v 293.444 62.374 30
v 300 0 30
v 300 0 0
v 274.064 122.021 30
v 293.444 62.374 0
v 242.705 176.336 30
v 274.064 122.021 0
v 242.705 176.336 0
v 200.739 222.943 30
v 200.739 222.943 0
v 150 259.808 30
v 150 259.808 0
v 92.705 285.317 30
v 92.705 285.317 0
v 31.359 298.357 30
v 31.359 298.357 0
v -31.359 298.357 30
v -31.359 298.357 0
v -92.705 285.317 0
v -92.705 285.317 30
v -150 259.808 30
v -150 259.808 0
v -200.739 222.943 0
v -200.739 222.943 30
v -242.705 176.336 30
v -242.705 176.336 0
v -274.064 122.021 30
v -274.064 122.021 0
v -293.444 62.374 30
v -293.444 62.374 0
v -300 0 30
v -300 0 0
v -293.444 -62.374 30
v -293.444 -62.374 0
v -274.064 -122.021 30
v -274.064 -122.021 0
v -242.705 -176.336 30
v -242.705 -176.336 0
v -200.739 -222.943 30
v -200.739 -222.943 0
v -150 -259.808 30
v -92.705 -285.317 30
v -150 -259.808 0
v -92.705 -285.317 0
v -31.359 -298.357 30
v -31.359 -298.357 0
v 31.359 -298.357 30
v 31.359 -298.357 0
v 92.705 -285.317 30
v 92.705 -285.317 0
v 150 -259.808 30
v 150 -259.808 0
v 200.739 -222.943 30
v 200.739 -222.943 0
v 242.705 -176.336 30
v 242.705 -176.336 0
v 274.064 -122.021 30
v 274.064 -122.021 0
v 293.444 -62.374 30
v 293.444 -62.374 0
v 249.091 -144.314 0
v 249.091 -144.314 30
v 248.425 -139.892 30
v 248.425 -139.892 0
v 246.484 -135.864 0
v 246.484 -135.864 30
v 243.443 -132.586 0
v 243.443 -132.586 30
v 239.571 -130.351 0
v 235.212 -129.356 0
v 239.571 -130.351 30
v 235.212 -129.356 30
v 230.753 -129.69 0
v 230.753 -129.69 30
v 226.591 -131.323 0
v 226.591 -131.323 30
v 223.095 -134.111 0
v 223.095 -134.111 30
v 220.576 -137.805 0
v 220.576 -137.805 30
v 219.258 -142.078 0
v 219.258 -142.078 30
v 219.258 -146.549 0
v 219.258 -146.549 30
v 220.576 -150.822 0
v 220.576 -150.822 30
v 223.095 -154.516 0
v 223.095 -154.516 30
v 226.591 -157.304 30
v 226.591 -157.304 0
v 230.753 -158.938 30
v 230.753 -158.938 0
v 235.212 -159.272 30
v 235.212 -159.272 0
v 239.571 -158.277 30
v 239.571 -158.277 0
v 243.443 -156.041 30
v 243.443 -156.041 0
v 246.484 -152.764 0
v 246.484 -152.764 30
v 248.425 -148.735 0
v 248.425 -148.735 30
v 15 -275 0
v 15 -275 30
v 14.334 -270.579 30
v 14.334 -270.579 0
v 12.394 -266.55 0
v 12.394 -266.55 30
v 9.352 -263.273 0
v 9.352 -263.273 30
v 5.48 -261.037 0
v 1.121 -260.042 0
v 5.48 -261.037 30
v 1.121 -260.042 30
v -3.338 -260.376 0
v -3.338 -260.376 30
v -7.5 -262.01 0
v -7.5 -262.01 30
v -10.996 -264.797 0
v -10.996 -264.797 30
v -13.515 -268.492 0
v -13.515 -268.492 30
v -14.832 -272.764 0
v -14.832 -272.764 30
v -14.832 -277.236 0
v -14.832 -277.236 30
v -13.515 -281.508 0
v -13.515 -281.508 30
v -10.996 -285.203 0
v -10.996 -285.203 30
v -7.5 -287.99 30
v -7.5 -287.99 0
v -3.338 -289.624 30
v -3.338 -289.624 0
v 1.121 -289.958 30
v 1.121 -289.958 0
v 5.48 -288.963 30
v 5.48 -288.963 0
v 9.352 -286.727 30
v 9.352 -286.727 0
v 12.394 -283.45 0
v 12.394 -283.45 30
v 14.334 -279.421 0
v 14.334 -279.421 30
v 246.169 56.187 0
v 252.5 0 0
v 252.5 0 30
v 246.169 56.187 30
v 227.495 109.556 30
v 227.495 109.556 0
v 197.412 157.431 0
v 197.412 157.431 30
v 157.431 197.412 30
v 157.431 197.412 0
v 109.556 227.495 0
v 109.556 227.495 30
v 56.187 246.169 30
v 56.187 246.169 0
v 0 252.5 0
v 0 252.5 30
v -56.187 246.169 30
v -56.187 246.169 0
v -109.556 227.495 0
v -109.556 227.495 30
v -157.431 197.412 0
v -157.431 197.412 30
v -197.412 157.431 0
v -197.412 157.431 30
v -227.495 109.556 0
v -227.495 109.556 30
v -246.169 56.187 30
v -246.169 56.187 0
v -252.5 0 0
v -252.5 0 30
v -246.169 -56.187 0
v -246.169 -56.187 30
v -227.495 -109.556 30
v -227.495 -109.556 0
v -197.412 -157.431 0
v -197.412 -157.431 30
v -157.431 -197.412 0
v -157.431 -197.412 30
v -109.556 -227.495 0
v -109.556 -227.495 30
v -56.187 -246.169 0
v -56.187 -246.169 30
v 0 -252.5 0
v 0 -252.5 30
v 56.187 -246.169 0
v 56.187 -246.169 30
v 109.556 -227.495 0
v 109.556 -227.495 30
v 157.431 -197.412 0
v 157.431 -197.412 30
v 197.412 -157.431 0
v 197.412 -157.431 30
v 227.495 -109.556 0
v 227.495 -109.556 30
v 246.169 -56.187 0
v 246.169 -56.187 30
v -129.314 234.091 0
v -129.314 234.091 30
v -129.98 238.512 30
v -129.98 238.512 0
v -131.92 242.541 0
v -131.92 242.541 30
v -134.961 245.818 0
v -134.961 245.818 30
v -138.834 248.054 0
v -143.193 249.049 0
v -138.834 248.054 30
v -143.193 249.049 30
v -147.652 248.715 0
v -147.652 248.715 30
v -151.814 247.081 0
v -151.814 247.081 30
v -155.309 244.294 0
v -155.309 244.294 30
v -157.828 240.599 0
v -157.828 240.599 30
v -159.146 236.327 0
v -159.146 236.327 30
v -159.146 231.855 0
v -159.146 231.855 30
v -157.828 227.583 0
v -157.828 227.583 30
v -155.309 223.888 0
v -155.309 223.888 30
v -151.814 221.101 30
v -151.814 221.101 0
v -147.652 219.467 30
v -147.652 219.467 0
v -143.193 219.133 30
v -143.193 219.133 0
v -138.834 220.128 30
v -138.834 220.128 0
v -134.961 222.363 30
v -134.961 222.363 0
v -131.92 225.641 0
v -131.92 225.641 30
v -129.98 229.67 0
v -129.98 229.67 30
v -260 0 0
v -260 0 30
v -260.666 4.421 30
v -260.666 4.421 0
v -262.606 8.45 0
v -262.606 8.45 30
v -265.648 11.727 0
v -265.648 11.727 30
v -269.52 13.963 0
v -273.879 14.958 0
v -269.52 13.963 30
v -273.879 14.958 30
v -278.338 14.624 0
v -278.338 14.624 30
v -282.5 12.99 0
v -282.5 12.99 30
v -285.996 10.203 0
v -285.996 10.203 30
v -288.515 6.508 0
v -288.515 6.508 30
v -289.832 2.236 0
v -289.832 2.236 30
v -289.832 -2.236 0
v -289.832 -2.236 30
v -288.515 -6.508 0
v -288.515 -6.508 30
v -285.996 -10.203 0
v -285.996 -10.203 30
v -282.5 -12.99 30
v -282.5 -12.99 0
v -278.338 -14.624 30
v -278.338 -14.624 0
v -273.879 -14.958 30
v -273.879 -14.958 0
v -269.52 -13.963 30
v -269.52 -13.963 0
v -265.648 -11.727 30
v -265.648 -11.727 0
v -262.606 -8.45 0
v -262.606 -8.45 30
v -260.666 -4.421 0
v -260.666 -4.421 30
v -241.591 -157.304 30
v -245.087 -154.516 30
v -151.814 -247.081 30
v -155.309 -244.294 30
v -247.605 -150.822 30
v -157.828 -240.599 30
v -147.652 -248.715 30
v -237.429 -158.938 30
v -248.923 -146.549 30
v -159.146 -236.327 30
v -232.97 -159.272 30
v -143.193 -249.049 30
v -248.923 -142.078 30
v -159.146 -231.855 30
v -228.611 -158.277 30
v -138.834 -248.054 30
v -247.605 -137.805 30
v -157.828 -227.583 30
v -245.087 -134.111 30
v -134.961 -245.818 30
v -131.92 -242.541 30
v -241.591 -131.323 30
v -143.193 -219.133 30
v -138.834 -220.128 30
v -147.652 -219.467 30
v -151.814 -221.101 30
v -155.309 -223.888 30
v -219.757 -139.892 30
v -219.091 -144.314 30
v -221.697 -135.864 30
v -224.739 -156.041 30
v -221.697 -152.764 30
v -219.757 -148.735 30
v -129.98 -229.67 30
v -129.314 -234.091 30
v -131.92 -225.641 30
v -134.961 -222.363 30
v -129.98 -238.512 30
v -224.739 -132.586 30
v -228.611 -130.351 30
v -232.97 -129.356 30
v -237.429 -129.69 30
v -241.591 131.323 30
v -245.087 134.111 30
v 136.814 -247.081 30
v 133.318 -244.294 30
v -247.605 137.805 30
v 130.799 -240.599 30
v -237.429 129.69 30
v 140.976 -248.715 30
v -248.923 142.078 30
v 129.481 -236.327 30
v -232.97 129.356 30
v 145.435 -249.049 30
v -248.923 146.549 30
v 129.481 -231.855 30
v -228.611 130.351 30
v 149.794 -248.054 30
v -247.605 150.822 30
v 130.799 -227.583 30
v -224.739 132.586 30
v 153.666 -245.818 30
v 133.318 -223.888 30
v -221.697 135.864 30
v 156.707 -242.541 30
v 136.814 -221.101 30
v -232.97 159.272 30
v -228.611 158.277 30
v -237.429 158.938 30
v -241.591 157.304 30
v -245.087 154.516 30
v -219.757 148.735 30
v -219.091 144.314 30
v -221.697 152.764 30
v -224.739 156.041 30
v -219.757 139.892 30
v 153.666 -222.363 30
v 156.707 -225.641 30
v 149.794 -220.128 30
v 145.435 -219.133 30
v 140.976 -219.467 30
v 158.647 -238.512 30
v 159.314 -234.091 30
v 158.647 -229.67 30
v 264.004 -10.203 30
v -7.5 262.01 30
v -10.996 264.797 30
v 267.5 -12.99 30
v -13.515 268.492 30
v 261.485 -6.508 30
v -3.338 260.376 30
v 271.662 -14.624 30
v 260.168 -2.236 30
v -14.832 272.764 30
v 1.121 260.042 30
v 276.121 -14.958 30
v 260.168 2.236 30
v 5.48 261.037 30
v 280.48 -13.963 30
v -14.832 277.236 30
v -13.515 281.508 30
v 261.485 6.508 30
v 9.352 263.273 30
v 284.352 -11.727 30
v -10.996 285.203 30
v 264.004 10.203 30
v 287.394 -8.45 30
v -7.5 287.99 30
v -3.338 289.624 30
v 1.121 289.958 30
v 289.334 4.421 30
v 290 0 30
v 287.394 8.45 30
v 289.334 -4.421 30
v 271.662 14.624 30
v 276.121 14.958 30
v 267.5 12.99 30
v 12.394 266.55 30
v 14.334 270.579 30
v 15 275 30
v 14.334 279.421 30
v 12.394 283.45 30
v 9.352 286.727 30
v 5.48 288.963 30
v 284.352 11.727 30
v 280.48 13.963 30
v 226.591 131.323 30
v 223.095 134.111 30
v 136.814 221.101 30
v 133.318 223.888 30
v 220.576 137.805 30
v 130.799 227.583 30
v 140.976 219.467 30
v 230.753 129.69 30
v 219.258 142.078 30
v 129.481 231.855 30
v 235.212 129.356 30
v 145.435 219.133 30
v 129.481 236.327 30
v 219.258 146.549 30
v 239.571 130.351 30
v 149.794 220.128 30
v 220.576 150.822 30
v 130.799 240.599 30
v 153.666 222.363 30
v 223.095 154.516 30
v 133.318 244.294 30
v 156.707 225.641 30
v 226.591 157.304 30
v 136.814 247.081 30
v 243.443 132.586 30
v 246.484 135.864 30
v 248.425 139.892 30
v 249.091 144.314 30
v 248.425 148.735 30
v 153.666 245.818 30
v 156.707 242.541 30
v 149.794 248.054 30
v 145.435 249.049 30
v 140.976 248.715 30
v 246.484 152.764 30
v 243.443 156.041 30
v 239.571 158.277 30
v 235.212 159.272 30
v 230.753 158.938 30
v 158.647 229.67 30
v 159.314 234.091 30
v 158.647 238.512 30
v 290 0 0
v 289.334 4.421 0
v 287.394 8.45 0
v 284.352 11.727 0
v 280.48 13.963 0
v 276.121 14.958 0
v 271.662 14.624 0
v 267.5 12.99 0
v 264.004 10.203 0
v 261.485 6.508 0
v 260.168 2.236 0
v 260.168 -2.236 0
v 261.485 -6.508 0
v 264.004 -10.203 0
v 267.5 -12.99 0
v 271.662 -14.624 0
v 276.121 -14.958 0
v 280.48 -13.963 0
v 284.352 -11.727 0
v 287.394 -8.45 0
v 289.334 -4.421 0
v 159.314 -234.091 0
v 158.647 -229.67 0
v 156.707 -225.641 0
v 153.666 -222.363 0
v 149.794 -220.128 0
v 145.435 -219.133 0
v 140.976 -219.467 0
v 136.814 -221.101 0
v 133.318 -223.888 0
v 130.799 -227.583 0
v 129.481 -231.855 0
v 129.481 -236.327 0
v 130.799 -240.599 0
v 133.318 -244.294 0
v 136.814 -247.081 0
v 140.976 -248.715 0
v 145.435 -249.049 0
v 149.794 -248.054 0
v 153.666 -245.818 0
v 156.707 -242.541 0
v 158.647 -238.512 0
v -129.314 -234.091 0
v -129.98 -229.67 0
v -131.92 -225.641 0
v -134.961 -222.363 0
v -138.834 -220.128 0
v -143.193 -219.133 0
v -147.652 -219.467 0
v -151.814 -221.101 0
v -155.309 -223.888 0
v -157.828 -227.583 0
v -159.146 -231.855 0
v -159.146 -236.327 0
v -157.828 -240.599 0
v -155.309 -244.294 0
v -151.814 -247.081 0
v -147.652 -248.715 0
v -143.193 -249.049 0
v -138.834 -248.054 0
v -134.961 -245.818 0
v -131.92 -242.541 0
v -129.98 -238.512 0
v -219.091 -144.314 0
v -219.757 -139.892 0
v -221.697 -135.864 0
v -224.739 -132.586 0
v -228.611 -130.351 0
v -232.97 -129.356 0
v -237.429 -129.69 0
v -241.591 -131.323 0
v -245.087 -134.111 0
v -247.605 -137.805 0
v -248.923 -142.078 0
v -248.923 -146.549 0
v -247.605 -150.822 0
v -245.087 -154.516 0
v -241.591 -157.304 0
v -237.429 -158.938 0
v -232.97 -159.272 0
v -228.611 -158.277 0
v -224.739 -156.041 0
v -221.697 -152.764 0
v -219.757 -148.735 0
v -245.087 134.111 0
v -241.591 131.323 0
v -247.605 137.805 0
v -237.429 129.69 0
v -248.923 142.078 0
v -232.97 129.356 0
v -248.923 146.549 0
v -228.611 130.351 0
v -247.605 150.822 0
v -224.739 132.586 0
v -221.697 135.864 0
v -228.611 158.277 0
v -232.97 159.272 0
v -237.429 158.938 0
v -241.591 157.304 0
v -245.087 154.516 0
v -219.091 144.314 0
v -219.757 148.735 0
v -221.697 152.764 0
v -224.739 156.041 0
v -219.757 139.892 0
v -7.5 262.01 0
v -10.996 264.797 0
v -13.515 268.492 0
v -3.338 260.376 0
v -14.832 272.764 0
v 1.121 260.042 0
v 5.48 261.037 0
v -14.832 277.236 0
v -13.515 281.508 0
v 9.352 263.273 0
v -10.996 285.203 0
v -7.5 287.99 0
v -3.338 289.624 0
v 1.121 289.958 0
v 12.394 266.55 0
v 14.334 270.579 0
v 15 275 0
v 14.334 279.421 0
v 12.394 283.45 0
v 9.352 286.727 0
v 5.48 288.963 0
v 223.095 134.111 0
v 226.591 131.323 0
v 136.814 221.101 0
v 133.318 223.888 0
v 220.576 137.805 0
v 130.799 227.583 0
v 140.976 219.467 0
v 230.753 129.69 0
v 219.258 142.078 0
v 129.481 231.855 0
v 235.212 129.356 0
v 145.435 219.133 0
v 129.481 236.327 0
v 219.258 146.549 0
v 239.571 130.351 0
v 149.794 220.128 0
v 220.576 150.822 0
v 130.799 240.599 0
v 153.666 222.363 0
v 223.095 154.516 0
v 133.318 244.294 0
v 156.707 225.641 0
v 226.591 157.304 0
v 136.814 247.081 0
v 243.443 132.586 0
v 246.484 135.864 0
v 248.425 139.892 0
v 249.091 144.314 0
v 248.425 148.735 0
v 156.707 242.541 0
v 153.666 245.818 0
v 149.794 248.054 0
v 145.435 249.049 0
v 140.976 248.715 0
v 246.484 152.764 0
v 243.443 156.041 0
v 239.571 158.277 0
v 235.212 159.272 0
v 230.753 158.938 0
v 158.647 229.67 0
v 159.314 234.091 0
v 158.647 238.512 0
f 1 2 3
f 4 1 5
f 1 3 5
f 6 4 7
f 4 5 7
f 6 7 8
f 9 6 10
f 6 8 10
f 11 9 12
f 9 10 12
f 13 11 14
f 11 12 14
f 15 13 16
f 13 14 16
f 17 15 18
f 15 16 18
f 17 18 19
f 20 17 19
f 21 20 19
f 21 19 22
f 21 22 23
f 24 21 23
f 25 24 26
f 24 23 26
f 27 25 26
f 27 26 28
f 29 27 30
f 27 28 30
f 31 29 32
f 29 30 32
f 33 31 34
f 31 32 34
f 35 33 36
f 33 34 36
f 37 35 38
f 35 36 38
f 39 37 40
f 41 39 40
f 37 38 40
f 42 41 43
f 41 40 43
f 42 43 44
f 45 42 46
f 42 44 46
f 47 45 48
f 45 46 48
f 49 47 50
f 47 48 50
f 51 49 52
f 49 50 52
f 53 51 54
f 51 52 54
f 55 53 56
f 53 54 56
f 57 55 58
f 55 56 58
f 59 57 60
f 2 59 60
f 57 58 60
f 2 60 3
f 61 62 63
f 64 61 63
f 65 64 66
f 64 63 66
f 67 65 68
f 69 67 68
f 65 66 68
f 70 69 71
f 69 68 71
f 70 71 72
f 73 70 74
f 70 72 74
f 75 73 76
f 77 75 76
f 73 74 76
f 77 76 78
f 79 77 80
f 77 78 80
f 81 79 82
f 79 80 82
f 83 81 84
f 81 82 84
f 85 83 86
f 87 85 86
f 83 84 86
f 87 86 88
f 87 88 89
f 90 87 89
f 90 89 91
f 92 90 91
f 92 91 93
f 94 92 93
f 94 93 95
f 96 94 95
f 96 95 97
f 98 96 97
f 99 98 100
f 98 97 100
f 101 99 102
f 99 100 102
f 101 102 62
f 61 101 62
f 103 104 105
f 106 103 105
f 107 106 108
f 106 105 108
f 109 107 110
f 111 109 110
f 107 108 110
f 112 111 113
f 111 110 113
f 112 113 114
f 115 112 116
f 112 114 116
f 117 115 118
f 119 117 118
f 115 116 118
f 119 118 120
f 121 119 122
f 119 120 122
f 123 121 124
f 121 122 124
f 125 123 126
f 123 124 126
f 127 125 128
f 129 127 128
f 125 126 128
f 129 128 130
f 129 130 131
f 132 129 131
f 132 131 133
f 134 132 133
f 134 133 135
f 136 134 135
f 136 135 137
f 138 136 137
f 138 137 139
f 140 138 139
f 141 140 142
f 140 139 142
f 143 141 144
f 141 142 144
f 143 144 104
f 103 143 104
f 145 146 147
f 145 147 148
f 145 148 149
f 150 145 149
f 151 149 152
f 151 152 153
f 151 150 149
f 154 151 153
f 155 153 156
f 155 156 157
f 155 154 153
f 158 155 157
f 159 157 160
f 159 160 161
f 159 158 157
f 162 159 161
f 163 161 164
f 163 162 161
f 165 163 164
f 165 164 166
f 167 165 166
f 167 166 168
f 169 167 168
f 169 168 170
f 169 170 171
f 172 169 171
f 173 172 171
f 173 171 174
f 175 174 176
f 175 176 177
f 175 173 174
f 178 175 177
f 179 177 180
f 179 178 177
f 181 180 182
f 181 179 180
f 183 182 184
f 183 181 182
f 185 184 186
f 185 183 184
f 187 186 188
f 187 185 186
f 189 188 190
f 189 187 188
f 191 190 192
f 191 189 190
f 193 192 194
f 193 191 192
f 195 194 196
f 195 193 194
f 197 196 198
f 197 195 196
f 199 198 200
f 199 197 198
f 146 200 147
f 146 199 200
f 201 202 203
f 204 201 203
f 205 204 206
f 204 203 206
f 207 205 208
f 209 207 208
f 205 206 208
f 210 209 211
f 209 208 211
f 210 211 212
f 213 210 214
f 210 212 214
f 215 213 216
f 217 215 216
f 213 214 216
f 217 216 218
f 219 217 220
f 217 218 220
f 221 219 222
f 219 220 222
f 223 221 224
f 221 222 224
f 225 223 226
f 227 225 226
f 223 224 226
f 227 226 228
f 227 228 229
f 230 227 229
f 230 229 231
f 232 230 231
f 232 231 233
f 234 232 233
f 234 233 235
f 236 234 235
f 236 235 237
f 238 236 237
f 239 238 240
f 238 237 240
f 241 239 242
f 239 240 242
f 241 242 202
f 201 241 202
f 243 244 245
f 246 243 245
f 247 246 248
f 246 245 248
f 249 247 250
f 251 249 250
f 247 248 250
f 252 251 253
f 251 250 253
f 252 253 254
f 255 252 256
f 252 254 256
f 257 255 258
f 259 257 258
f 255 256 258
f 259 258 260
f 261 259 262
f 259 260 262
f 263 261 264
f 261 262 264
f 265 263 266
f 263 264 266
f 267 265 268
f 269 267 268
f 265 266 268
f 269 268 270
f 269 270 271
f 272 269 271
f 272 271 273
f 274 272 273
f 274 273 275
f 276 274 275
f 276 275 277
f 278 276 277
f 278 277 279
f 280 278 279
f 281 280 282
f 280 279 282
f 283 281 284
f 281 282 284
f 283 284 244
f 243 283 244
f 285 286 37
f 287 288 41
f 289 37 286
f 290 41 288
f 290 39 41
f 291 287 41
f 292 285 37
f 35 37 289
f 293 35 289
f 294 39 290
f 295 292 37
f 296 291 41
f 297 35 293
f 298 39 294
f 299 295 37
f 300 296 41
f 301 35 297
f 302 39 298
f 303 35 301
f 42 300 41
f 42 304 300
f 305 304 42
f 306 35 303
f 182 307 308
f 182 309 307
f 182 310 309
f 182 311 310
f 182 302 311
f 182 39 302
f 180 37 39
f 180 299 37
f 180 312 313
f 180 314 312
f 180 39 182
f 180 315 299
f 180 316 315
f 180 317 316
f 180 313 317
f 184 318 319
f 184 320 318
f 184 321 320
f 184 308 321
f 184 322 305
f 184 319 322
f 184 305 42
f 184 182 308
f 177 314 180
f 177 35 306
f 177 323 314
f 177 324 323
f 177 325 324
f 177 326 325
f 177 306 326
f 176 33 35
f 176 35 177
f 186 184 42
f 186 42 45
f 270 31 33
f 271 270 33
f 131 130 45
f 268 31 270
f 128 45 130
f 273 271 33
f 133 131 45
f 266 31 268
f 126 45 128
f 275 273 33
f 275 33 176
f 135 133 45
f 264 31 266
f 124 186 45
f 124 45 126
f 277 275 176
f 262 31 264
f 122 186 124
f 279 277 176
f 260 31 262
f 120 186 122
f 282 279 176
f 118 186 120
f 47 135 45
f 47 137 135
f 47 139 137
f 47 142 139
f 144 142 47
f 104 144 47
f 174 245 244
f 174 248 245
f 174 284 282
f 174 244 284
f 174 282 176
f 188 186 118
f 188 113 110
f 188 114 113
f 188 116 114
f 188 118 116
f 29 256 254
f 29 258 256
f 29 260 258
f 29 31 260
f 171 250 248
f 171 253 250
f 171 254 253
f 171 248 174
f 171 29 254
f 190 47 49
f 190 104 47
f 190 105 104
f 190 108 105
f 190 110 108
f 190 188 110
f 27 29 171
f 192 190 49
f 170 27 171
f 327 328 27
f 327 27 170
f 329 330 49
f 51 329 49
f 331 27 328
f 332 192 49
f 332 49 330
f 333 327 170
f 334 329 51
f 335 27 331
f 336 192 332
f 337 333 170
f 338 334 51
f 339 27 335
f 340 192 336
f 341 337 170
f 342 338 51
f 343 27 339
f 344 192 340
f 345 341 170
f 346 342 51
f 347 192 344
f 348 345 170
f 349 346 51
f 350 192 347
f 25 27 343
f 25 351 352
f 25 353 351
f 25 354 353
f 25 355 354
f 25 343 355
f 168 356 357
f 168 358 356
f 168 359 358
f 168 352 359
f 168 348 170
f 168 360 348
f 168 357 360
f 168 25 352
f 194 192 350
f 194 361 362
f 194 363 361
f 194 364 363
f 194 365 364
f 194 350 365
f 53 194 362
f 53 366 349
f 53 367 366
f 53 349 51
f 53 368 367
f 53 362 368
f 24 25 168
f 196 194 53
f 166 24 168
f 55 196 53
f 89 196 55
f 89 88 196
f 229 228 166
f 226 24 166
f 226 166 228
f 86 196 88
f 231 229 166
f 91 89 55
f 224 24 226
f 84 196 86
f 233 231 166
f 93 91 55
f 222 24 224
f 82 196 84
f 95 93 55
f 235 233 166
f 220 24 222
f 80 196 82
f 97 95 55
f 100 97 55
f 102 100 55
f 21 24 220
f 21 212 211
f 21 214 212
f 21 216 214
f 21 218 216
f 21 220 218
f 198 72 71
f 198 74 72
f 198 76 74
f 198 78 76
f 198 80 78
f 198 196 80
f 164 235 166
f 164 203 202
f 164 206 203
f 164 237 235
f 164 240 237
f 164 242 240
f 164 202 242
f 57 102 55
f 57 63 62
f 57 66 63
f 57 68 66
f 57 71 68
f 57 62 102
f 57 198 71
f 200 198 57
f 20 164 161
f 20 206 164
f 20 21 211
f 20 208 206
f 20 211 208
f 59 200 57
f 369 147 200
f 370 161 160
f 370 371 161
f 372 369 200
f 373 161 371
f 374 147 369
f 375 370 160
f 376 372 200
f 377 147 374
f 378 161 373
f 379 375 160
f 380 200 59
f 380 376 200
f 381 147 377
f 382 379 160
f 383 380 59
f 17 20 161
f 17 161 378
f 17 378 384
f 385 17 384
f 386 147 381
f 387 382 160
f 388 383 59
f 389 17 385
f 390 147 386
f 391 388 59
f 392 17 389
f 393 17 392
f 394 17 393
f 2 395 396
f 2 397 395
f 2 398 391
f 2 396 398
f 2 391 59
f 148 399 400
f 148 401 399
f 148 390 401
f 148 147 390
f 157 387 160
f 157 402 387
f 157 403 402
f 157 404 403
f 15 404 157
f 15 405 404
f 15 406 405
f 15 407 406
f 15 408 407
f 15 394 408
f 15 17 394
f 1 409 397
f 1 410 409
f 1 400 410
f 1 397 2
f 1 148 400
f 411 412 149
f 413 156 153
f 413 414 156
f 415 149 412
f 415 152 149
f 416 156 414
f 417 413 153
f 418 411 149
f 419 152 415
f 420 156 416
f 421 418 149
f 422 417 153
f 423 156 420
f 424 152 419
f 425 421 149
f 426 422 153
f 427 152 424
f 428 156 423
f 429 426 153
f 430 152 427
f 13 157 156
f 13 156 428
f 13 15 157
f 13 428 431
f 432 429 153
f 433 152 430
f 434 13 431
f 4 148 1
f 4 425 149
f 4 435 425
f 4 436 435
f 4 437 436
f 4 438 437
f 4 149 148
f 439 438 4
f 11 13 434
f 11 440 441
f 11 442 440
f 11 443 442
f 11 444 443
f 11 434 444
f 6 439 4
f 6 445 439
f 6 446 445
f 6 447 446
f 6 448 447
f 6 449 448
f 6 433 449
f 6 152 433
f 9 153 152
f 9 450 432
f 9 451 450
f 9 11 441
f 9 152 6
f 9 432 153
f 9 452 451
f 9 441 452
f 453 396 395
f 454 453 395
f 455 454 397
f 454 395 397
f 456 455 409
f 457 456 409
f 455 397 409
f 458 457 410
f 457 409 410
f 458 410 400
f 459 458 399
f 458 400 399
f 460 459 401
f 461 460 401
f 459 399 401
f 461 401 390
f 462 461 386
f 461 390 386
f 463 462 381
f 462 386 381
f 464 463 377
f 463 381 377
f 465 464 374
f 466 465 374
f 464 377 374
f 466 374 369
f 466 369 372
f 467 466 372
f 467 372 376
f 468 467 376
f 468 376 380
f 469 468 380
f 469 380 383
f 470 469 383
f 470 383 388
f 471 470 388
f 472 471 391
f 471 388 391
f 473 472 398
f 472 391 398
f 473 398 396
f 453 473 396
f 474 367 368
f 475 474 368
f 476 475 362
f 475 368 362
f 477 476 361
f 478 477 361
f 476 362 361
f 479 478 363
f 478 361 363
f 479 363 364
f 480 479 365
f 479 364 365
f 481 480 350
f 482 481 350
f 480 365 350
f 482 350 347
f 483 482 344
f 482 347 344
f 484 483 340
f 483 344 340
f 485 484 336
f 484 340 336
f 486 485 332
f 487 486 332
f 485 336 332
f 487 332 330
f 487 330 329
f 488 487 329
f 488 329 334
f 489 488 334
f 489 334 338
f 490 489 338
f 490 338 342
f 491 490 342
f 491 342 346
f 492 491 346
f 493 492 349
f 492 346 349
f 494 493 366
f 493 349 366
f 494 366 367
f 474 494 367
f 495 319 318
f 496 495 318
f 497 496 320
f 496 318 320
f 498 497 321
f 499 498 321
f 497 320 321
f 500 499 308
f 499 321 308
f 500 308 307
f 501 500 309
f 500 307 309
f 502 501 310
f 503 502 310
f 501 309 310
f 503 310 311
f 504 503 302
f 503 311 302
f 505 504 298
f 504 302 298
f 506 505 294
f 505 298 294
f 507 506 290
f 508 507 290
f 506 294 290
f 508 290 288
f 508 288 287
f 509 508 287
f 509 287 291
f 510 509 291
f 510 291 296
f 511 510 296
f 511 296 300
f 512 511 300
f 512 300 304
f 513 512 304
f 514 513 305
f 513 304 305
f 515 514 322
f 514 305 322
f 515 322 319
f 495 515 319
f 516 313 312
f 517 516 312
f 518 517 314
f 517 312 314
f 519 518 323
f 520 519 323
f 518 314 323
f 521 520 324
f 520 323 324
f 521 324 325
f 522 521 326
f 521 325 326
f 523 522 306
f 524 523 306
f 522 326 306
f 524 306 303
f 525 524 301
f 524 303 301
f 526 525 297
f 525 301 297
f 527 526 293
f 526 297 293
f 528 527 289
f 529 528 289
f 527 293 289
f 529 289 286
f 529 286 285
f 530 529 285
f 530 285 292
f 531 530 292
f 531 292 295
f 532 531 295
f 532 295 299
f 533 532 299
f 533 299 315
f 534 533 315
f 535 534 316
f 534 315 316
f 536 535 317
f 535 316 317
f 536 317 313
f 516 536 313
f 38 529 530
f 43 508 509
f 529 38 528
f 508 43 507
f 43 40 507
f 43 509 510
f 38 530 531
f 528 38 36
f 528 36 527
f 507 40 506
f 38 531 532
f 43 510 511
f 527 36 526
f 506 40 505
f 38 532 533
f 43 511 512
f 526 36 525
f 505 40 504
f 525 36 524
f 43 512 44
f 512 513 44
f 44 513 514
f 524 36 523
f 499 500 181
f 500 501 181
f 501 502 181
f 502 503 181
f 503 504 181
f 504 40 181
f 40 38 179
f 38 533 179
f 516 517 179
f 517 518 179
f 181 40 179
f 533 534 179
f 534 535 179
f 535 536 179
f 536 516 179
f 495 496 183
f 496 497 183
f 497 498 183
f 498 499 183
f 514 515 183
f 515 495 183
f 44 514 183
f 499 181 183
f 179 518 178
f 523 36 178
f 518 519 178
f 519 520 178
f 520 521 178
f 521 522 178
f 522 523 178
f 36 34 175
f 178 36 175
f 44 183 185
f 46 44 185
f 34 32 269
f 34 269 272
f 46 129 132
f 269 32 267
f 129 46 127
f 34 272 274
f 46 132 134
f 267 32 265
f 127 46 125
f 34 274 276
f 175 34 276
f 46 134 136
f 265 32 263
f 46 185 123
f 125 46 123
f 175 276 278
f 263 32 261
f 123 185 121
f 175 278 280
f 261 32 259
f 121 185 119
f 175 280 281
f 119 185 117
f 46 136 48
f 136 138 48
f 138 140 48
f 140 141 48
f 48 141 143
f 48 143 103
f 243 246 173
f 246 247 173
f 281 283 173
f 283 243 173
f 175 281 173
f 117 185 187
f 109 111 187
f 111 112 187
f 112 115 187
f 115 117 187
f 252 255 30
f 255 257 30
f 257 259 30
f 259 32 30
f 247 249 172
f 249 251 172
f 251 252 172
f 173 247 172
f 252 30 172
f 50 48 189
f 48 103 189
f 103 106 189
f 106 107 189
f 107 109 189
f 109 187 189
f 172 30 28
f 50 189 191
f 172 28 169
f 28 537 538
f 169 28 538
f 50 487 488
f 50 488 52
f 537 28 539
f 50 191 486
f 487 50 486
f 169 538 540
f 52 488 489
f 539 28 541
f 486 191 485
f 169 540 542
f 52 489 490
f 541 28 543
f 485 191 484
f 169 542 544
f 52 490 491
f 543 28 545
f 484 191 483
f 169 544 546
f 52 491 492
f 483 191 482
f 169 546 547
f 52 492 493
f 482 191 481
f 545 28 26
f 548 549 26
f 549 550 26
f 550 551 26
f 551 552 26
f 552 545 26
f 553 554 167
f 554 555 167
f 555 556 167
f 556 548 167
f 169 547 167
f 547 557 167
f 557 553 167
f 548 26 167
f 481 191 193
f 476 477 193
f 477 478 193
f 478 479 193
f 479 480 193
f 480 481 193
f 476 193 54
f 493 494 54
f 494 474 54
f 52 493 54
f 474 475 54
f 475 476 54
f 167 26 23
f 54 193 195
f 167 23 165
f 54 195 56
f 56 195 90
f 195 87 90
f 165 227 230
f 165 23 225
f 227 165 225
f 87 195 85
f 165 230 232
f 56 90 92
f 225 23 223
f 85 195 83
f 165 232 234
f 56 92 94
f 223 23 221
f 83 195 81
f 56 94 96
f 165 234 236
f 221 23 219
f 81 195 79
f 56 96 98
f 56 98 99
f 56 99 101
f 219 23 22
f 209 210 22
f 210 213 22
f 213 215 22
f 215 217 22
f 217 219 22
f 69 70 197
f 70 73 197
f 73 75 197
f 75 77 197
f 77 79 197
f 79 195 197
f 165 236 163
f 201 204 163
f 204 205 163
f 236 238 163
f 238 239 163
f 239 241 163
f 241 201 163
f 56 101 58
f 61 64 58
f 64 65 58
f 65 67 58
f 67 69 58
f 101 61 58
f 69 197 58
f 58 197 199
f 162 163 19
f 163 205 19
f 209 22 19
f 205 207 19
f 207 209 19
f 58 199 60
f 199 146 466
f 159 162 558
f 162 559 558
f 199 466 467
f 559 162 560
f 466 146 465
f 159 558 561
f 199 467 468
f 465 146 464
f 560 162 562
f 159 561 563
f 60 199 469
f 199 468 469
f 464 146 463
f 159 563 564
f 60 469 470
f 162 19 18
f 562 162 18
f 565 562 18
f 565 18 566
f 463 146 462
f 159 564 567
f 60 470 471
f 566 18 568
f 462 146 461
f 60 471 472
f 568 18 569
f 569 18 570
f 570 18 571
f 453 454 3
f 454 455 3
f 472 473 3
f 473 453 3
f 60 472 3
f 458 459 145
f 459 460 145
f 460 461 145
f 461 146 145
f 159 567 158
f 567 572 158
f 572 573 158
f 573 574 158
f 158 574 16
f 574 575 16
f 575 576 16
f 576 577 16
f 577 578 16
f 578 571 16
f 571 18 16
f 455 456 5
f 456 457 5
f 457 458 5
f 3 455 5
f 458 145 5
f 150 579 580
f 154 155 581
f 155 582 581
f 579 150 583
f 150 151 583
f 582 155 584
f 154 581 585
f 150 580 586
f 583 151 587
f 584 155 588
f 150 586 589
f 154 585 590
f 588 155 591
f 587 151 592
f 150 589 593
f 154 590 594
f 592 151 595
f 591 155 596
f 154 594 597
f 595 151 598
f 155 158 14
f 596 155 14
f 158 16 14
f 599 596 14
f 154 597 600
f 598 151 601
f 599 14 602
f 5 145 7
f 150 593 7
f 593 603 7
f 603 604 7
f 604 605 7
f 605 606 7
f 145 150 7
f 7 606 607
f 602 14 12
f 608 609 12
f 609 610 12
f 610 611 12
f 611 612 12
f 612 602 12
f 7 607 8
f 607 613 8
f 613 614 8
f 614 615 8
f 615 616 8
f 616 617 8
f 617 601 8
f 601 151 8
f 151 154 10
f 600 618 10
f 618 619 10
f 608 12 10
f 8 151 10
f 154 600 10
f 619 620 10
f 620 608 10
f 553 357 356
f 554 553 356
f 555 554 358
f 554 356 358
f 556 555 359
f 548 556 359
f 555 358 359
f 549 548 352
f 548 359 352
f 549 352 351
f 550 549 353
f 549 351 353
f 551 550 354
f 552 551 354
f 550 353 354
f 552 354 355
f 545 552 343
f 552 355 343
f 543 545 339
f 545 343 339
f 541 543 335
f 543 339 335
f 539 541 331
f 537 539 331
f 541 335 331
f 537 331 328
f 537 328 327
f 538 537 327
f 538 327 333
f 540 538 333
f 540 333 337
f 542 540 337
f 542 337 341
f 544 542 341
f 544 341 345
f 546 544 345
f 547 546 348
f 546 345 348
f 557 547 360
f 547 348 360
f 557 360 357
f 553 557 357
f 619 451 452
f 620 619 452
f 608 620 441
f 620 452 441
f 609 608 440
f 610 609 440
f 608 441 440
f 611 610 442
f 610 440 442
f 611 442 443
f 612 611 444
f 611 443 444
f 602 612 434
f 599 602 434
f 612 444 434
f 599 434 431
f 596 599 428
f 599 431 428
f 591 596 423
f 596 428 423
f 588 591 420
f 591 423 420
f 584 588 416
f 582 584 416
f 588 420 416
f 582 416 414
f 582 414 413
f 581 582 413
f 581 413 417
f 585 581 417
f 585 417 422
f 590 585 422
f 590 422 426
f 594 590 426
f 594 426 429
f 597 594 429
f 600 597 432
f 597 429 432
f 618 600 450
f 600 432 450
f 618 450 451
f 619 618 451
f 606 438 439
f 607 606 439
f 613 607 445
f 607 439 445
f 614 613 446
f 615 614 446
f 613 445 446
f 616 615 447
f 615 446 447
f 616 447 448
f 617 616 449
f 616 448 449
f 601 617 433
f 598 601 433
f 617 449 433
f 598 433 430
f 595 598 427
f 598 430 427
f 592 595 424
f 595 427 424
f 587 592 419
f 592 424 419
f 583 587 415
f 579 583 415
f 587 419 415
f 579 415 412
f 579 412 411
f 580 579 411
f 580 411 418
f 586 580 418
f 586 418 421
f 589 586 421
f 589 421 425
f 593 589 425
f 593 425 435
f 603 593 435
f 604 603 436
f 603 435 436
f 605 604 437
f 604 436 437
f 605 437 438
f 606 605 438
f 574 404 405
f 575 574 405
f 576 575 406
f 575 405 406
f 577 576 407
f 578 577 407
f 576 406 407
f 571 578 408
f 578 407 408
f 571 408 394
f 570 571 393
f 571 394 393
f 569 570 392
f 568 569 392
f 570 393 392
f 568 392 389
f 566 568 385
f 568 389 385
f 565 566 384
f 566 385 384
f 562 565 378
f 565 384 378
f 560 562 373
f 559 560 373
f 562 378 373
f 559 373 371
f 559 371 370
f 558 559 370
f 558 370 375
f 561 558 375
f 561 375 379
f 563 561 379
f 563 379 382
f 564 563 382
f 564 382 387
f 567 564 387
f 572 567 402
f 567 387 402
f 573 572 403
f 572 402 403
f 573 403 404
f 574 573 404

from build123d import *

# Parameters (mm, degrees)
IZIM1_R                     = 300
IZIM1_R_2                   = 252.5
Y_KSEKLIK_EKSTR_ZYON1_DEPTH = 30
IZIM2_R                     = 15
KES_EKSTR_ZYON1_DEPTH       = 30


with BuildPart() as part:
    # Çizim1 → Yükseklik-Ekstrüzyon1 (new body)
    with BuildSketch(Plane.XY):
        Circle(IZIM1_R)
        Circle(IZIM1_R_2, mode=Mode.SUBTRACT)
    extrude(amount=Y_KSEKLIK_EKSTR_ZYON1_DEPTH)

    # Çizim2 → Kes-Ekstrüzyon1 (cut)
    with BuildSketch(Plane.XY.offset(30)):
        with Locations((0, 275)):
            Circle(IZIM2_R)
        with Locations((275, 0)):
            Circle(IZIM2_R)
        with Locations((-275, 0)):
            Circle(IZIM2_R)
        with Locations((0, -275)):
            Circle(IZIM2_R)
        with Locations((-144.313707876, -234.090909091)):
            Circle(IZIM2_R)
        with Locations((-234.090909091, -144.313707876)):
            Circle(IZIM2_R)
        with Locations((-234.090909091, 144.313707876)):
            Circle(IZIM2_R)
        with Locations((144.313707876, -234.090909091)):
            Circle(IZIM2_R)
        with Locations((234.090909091, -144.313707876)):
            Circle(IZIM2_R)
        with Locations((234.090909091, 144.313707876)):
            Circle(IZIM2_R)
        with Locations((-144.313707876, 234.090909091)):
            Circle(IZIM2_R)
        with Locations((144.313707876, 234.090909091)):
            Circle(IZIM2_R)
    extrude(amount=-KES_EKSTR_ZYON1_DEPTH, mode=Mode.SUBTRACT)


solid = part.part
